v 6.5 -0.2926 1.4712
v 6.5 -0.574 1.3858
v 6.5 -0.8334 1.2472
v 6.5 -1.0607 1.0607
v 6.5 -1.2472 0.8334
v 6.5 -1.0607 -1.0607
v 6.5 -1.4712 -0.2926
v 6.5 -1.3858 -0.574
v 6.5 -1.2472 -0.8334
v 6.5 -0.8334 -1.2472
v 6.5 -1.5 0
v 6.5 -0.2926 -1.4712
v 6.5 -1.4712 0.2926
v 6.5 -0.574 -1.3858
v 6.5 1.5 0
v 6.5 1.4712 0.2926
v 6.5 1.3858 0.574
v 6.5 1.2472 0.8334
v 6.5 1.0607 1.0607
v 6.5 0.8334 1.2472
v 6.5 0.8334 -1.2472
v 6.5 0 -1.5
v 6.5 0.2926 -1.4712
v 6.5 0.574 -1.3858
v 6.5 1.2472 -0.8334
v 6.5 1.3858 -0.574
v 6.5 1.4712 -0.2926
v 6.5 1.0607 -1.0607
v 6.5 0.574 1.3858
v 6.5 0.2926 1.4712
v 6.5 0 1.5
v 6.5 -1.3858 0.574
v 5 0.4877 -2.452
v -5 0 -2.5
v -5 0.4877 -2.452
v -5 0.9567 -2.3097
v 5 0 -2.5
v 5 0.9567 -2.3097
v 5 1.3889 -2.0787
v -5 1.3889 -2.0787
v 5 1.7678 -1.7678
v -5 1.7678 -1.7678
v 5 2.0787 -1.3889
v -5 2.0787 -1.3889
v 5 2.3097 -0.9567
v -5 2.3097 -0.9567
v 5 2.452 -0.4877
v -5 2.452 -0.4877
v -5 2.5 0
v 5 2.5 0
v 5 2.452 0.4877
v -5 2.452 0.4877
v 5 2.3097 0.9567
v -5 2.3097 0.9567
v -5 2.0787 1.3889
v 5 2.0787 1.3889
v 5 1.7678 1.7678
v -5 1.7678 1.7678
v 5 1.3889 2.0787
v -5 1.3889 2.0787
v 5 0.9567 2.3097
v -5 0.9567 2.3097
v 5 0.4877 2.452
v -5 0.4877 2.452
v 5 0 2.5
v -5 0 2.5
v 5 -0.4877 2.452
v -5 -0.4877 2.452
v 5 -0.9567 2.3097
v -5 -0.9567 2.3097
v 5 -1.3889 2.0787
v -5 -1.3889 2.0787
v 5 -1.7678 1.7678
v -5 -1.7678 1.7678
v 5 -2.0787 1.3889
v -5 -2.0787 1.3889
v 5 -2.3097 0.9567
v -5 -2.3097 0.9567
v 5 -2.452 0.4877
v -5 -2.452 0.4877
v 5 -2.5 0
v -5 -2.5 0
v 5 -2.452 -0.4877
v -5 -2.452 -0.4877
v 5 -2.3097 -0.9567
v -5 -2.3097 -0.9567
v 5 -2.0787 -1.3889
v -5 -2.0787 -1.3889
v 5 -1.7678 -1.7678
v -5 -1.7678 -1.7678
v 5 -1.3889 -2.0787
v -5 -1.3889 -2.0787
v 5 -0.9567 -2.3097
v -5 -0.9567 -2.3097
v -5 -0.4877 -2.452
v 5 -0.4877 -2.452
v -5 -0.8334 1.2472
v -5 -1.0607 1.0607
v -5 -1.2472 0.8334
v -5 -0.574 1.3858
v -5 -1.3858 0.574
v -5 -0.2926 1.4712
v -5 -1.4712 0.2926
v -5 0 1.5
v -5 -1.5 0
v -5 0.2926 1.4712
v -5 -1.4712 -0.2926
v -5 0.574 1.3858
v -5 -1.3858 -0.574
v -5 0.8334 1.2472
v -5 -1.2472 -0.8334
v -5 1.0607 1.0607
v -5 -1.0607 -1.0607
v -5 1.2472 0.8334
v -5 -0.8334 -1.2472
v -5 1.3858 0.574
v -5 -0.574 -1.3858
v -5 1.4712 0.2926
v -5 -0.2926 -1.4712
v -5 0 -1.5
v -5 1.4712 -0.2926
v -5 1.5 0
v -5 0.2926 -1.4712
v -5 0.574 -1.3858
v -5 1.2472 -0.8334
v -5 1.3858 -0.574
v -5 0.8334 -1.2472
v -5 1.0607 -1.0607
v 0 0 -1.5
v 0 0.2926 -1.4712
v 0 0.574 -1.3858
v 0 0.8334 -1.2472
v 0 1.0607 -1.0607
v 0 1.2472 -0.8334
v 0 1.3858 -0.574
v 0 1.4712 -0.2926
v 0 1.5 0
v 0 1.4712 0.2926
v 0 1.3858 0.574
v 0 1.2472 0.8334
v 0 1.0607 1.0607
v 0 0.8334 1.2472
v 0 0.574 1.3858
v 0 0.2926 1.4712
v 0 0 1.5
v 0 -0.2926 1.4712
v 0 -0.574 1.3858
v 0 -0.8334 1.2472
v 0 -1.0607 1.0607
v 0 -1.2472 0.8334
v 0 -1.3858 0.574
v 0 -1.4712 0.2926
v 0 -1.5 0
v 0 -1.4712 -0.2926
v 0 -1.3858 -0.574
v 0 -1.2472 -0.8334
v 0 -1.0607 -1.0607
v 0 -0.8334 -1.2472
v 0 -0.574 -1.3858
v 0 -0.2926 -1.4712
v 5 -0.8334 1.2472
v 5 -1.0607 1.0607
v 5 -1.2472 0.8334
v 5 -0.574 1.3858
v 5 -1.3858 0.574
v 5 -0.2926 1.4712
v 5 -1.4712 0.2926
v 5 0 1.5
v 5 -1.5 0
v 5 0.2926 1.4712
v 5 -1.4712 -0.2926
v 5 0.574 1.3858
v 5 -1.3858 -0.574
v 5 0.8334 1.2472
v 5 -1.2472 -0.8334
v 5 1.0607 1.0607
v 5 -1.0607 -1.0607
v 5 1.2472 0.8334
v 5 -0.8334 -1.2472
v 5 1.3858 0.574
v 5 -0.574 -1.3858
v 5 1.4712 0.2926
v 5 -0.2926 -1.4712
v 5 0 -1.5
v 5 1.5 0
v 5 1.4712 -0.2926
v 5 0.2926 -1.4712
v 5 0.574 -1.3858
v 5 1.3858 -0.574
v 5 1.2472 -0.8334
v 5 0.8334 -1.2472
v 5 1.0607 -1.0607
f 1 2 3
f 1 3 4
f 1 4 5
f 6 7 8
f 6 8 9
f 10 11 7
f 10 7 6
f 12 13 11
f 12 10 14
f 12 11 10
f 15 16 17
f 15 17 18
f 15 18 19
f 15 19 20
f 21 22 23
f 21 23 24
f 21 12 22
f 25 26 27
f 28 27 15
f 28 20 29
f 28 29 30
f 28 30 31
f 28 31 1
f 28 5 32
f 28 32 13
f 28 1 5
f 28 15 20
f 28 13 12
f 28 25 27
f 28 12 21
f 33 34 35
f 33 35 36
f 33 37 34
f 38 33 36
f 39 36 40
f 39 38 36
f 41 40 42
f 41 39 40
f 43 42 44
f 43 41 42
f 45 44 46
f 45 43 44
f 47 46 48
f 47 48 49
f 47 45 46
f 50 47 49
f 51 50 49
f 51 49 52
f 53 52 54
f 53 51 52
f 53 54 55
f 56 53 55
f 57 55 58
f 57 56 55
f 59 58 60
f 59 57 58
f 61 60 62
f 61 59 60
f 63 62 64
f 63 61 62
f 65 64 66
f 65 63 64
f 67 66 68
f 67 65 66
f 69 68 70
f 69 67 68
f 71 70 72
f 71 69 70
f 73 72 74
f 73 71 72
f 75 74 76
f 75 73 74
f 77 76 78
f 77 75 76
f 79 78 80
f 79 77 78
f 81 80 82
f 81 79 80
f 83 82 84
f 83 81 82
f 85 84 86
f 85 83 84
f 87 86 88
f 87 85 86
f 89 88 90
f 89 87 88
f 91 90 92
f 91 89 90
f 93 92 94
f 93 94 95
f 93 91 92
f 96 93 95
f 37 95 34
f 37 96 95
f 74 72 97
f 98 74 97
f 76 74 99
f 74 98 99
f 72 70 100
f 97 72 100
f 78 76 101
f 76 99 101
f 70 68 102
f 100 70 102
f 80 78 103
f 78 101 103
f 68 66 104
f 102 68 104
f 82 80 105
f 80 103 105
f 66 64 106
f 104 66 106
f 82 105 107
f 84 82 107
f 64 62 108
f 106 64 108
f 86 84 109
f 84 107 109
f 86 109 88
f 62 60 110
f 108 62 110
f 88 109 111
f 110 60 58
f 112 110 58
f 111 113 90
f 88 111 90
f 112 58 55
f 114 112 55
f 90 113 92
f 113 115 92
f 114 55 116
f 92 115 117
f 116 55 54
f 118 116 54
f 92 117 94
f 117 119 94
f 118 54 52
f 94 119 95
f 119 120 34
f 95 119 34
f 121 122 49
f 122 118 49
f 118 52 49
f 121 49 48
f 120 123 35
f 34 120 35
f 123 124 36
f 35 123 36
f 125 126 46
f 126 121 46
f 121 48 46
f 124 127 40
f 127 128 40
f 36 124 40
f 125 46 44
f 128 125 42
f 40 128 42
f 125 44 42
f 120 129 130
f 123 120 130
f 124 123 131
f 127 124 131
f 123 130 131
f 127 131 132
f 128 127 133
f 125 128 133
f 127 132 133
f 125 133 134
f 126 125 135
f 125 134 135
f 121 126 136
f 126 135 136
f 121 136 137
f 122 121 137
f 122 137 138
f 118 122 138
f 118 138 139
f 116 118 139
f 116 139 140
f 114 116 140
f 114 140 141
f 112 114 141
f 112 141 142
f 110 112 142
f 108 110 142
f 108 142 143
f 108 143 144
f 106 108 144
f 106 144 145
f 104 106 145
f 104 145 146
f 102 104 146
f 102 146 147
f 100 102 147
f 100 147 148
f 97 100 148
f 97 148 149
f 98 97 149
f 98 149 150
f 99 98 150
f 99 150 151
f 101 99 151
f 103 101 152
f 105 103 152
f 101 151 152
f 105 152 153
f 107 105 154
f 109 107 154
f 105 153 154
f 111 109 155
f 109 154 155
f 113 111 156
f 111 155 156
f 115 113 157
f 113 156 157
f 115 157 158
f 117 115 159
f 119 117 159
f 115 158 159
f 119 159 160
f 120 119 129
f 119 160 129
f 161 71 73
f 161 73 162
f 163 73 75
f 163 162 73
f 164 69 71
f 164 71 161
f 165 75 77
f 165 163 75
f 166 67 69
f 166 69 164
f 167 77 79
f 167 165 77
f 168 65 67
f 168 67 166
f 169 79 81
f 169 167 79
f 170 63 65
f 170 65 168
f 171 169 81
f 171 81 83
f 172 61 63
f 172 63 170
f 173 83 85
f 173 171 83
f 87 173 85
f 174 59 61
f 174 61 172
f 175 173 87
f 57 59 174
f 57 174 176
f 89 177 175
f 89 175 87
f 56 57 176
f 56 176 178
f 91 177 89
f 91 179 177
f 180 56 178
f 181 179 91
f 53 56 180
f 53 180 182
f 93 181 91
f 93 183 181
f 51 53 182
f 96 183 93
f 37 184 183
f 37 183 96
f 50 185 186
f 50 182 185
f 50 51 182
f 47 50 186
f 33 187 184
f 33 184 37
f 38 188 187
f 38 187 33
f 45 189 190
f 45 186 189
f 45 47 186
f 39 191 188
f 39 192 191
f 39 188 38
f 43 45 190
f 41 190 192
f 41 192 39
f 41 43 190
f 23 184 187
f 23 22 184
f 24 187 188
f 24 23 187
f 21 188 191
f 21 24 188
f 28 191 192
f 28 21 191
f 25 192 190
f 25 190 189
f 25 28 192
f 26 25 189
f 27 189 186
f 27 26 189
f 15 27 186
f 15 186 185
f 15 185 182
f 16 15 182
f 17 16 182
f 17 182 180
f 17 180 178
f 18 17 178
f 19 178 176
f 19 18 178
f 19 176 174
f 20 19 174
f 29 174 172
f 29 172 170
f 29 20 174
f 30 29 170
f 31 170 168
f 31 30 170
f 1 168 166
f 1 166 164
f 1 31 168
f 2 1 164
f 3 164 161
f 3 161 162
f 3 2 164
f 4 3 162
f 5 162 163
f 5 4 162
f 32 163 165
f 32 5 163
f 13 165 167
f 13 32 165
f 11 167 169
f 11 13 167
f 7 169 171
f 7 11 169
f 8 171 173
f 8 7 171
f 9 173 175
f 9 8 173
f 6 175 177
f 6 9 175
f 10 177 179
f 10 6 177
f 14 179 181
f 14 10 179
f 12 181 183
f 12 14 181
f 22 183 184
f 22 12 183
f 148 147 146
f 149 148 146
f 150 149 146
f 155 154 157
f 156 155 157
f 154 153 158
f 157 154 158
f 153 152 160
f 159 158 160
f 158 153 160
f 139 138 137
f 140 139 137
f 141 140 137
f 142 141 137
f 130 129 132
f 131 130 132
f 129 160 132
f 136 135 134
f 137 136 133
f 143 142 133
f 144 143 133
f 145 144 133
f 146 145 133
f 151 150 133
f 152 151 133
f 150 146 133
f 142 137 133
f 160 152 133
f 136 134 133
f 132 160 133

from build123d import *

# Parameters (mm, degrees)
SKETCH_1_R          = 2.5
EXTRUDE_1_DEPTH     = 5
SKETCH_2_R          = 1.5
CUT_EXTRUDE_1_DEPTH = 15
SKETCH_3_R          = 1.5
EXTRUDE_4_DEPTH     = 1.5


with BuildPart() as part:
    # 草图1 → 凸台-拉伸1 (new, symmetric)
    with BuildSketch(Plane(origin=(0, 0, 0), x_dir=(0, 0, -1), z_dir=(1, 0, 0))):
        Circle(SKETCH_1_R)
    extrude(amount=EXTRUDE_1_DEPTH, both=True)

    # 草图2 → 切除-拉伸1 (cut)
    with BuildSketch(Plane(origin=(0, 0, 0), x_dir=(0, 0, -1), z_dir=(1, 0, 0))):
        Circle(SKETCH_2_R)
    extrude(amount=-CUT_EXTRUDE_1_DEPTH, mode=Mode.SUBTRACT)

    # 草图3 → 凸台-拉伸4 (add, symmetric)
    with BuildSketch(Plane(origin=(5, 0, 0), x_dir=(0, 0, -1), z_dir=(1, 0, 0))):
        Circle(SKETCH_3_R)
    extrude(amount=EXTRUDE_4_DEPTH, both=True)


solid = part.part
